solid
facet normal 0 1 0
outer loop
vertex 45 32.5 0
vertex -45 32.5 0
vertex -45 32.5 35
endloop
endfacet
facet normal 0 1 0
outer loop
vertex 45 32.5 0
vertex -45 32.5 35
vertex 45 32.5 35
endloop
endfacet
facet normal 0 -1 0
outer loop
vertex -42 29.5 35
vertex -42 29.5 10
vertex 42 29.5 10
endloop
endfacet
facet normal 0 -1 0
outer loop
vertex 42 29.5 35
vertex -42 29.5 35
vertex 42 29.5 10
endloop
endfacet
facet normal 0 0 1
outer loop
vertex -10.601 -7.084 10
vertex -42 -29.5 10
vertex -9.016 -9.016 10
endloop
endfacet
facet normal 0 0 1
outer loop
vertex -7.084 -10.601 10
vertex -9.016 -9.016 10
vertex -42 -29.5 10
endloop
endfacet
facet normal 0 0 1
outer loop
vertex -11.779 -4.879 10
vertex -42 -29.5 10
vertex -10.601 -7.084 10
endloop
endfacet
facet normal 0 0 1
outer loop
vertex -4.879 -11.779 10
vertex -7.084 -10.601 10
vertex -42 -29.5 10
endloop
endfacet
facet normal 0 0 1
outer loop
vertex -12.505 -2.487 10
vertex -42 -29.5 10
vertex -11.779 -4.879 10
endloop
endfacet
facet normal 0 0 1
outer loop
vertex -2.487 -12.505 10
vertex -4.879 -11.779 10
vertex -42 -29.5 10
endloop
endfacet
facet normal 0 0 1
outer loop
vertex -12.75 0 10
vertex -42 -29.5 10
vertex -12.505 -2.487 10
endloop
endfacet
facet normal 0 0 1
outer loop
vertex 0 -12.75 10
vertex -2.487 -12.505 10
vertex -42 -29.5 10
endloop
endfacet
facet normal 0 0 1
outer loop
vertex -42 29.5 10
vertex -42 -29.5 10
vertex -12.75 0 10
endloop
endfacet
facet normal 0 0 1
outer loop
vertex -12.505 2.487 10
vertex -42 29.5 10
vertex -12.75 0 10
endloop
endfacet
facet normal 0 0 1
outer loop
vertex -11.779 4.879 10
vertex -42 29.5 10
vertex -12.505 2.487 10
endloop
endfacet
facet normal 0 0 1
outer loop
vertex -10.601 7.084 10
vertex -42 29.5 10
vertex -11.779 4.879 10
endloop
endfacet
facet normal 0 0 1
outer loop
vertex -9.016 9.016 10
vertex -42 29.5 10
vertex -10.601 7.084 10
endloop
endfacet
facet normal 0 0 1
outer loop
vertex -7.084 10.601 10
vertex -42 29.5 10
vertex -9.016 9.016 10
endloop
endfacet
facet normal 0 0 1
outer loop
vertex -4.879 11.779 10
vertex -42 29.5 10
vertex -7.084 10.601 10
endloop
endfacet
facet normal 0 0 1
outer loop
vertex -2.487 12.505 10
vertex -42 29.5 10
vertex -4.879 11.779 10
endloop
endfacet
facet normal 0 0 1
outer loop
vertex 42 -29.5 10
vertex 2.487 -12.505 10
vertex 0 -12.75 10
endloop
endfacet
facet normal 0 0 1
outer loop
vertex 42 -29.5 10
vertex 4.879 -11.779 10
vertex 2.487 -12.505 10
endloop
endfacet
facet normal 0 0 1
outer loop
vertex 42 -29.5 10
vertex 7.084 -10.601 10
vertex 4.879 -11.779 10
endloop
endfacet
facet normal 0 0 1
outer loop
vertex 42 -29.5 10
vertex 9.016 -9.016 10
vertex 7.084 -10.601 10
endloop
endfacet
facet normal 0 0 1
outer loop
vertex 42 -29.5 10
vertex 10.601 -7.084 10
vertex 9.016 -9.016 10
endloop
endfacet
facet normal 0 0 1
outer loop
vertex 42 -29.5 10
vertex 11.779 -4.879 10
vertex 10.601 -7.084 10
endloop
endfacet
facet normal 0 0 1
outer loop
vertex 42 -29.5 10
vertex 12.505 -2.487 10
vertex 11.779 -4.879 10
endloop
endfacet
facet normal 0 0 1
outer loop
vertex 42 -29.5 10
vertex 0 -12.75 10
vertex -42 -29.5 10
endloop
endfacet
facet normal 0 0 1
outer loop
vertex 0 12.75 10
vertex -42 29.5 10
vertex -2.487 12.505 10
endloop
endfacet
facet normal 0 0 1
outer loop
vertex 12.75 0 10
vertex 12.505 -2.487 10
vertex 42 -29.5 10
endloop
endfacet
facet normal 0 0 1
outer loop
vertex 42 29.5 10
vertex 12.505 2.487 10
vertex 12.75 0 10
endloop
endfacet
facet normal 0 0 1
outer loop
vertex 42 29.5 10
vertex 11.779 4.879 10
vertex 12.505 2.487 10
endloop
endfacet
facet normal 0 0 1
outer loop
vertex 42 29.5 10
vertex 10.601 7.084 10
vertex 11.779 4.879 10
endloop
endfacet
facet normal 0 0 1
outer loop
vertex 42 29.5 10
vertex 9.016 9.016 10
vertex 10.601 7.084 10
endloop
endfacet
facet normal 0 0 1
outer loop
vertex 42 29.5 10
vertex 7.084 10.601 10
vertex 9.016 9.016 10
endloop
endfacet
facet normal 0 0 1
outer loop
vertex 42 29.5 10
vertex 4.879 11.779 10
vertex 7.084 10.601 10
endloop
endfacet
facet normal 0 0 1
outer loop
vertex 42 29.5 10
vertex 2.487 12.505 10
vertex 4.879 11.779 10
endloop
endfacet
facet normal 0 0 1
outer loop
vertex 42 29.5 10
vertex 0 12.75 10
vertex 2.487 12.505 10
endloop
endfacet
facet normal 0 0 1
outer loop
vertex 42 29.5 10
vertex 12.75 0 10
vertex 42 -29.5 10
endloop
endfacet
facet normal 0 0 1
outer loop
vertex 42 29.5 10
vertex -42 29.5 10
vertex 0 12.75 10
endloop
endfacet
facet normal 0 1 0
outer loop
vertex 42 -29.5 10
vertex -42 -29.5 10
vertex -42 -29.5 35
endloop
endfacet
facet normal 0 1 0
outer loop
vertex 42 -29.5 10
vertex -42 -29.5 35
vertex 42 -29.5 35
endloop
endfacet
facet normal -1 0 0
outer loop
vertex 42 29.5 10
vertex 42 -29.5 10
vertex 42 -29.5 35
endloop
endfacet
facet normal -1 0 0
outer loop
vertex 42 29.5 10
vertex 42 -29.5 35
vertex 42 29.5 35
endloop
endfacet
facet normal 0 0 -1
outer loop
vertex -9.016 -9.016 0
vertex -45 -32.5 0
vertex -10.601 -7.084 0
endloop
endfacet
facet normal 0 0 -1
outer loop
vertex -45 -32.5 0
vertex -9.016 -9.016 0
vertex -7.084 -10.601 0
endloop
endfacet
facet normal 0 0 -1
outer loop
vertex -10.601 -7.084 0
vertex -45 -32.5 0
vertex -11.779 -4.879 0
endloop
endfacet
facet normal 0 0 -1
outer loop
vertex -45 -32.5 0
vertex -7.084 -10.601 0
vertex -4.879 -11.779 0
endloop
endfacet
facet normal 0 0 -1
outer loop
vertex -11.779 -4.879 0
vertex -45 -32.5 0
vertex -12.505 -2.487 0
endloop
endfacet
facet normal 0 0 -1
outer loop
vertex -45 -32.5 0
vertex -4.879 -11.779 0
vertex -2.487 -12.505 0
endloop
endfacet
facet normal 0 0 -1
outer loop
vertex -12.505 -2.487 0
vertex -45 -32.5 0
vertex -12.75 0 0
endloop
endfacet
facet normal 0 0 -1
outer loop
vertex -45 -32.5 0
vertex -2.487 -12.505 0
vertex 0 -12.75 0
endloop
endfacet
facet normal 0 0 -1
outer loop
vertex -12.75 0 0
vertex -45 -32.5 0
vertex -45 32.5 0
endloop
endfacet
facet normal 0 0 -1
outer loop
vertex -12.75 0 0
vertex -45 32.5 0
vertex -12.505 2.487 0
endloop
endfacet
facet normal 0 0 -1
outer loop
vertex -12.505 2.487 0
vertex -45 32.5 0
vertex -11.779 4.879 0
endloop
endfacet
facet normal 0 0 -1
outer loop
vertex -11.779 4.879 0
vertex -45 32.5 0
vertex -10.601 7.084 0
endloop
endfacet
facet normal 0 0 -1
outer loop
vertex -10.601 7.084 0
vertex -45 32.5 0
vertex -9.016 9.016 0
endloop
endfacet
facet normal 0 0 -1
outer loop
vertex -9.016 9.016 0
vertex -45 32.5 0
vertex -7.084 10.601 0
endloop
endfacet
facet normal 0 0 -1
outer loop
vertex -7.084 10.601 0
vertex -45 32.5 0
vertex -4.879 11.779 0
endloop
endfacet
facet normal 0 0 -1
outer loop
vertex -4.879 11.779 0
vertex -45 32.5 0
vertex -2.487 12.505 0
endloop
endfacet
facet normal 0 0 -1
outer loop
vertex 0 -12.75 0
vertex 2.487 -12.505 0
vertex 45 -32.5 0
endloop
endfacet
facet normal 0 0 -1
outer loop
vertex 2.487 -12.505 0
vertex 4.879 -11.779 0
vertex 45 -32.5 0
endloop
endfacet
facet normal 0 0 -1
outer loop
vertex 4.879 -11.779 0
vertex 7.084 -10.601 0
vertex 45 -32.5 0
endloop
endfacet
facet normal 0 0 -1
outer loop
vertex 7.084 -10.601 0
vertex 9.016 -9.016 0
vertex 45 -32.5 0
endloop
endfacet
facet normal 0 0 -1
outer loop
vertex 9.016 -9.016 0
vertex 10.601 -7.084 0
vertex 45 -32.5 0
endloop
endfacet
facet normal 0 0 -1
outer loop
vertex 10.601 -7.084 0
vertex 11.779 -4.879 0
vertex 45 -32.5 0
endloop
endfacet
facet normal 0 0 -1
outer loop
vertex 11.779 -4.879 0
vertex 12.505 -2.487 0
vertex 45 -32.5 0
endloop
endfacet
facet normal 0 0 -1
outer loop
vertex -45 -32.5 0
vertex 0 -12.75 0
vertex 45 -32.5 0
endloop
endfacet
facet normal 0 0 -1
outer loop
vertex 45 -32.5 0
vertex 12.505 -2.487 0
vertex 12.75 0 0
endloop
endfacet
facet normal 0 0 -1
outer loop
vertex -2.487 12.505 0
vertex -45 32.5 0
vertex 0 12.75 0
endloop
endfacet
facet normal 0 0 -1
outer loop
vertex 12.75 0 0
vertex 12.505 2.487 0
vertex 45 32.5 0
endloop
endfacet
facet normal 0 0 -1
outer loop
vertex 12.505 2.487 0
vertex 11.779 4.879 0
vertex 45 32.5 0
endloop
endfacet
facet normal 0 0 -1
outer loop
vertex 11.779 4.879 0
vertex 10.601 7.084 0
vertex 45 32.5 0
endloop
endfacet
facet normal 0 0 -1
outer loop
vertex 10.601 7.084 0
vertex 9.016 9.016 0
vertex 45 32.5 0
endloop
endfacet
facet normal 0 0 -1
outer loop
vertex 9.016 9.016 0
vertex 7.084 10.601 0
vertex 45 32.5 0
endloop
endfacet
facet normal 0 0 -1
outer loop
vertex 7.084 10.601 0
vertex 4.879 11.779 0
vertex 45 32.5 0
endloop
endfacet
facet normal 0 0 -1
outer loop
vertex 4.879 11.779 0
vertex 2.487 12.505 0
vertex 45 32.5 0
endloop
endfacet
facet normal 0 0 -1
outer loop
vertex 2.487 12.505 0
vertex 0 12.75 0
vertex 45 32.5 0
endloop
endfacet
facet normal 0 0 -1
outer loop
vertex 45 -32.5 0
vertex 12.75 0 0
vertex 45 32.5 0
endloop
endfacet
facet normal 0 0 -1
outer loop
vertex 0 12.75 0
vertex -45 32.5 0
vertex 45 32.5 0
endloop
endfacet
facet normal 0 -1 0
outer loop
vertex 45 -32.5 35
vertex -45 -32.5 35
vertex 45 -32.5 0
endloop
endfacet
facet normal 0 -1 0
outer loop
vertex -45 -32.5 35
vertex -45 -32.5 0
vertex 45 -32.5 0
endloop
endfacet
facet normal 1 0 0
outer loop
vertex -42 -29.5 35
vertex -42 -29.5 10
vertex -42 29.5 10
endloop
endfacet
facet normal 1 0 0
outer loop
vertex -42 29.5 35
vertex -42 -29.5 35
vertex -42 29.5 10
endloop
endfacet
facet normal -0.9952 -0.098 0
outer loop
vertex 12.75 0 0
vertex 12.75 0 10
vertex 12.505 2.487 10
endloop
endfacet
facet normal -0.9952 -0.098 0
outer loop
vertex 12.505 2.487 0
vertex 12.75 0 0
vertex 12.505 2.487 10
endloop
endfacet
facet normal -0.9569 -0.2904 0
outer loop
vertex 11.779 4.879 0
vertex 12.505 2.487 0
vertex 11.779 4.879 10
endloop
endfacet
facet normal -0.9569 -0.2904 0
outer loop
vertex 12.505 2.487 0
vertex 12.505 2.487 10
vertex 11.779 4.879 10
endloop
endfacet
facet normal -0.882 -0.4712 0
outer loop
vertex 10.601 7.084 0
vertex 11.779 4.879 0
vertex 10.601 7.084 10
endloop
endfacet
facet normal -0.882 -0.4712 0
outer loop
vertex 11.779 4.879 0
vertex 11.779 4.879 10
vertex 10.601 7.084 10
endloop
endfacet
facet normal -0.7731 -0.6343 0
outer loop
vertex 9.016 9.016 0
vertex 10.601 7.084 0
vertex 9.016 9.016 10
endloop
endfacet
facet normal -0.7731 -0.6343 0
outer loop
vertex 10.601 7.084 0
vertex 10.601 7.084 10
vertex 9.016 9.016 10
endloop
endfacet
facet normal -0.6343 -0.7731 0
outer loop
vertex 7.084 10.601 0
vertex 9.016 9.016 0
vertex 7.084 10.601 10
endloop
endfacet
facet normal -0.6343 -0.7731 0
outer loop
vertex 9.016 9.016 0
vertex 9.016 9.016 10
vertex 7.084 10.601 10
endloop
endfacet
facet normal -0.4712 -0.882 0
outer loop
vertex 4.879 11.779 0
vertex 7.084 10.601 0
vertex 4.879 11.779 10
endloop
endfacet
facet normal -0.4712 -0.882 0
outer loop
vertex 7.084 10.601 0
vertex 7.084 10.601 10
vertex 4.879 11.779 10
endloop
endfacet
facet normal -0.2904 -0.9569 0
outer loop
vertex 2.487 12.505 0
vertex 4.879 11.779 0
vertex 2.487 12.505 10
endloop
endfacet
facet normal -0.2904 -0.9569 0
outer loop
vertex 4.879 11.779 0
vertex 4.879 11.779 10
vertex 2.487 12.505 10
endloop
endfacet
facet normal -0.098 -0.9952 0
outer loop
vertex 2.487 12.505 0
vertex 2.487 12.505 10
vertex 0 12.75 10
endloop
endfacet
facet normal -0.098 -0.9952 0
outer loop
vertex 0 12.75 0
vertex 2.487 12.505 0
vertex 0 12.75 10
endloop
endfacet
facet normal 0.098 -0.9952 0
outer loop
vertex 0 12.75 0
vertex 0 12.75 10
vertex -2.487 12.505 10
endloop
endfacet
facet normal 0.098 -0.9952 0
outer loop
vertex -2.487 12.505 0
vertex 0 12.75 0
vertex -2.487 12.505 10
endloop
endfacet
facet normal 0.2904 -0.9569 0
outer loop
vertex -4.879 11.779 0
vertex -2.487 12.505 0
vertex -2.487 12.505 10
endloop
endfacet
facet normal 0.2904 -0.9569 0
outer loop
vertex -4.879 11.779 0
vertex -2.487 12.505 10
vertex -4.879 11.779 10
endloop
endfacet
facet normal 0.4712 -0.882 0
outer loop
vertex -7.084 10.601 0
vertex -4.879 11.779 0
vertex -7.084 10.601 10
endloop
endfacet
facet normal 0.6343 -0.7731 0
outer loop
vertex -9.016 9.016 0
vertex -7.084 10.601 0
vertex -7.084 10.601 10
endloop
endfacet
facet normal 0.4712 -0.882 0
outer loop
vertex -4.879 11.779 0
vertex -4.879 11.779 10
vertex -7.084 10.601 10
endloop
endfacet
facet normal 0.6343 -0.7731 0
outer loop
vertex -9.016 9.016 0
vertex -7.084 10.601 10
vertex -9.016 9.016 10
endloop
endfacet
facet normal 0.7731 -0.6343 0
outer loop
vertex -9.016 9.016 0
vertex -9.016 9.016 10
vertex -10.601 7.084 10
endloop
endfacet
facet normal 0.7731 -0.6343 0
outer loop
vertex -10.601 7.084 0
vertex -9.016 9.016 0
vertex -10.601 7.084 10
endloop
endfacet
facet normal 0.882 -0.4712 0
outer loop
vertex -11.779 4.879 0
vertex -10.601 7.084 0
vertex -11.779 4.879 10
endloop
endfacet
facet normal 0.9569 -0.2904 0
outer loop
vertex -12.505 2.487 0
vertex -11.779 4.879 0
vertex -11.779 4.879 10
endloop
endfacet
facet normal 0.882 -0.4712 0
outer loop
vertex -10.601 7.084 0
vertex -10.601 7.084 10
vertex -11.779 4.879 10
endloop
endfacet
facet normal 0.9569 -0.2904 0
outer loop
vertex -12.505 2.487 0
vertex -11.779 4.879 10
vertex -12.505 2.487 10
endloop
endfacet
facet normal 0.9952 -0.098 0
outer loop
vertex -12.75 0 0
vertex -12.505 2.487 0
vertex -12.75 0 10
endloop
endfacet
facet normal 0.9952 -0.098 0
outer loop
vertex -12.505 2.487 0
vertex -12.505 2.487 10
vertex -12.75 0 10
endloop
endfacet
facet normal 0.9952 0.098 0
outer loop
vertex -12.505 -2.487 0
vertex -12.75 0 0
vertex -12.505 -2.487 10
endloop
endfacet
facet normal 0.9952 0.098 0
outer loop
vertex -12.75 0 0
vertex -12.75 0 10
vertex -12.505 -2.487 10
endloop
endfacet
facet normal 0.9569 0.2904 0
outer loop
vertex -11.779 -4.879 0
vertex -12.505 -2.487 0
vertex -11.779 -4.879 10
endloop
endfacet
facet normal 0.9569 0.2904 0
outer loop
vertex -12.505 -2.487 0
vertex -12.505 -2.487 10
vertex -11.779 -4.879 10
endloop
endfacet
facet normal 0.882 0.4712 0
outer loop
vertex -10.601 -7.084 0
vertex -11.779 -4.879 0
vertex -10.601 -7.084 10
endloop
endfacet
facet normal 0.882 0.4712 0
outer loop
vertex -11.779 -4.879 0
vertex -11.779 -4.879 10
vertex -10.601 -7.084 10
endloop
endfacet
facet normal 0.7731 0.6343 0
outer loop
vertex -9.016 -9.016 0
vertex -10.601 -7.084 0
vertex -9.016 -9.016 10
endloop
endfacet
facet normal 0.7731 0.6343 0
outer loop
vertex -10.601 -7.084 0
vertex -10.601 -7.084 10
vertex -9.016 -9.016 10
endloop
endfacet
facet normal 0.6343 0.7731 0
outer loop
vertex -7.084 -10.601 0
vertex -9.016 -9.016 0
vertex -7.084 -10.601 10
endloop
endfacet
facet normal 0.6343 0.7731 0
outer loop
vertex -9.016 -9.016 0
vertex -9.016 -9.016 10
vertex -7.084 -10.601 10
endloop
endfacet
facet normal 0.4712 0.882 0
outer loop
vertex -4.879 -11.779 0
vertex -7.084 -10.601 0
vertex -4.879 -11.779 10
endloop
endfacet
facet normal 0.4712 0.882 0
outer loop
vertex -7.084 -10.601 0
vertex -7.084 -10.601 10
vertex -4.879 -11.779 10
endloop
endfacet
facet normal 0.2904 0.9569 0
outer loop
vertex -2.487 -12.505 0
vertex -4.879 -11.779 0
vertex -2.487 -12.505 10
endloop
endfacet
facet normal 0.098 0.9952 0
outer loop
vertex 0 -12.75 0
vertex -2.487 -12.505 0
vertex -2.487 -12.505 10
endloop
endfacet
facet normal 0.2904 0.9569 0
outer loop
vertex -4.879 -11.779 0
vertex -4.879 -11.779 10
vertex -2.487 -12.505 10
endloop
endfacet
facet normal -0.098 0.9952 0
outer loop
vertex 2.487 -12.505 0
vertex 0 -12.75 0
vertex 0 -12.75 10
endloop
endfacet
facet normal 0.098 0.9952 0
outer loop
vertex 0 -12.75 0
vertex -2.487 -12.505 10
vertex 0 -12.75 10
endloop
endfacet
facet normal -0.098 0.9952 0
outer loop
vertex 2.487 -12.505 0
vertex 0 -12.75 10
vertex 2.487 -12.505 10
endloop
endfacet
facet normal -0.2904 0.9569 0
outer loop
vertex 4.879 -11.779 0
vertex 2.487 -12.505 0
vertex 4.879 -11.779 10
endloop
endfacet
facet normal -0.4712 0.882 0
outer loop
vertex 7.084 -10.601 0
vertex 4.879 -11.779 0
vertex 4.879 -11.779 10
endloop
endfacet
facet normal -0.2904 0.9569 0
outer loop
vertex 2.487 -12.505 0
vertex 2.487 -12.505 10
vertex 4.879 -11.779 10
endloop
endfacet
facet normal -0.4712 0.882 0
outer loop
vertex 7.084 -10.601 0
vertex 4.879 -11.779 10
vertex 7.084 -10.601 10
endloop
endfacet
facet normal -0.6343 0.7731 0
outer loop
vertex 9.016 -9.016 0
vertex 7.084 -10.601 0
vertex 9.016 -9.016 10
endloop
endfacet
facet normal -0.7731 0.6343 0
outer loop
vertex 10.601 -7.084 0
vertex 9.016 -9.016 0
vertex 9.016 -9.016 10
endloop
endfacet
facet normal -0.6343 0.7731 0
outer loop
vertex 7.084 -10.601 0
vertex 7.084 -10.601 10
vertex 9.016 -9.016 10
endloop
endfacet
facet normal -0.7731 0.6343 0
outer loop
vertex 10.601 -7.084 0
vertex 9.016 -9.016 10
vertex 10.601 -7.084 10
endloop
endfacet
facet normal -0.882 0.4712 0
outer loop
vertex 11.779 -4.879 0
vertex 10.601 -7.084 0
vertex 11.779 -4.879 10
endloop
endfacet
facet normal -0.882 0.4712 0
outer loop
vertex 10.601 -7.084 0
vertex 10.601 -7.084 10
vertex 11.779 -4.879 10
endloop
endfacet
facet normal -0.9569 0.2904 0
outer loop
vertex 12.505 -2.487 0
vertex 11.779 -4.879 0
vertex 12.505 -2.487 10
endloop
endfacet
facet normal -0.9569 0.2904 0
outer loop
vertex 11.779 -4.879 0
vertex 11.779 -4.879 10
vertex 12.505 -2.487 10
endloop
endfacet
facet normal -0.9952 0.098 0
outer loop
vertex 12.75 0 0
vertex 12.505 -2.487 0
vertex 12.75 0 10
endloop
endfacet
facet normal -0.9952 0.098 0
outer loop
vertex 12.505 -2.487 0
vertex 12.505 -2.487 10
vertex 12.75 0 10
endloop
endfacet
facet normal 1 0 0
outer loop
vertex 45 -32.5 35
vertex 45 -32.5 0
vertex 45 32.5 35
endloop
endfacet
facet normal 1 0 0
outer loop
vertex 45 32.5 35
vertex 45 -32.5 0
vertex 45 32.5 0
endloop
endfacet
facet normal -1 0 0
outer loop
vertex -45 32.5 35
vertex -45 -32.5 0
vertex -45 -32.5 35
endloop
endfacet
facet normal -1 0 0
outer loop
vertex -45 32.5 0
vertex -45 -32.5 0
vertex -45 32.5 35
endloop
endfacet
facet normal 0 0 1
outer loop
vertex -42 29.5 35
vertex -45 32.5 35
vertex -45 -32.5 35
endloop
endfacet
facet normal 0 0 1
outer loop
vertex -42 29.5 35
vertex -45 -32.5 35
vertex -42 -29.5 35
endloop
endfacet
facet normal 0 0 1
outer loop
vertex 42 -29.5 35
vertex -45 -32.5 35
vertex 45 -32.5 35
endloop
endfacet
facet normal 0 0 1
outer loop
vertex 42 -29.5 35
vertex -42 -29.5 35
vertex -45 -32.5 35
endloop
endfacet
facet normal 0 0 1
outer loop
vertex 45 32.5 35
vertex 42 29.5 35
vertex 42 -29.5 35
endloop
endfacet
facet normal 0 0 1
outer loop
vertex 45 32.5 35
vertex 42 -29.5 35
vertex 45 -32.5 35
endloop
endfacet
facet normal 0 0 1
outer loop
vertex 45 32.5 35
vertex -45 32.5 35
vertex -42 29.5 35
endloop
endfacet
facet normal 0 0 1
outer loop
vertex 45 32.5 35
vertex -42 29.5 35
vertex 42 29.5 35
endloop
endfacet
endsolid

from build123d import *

# Parameters (mm, degrees)
F0_W     = 90
F0_H     = 65
F1_DEPTH = 10
F2_R     = 12.75
F3_DEPTH = 10
F4_W     = 90
F4_H     = 65
F4_W_2   = 84
F4_H_2   = 59
F5_DEPTH = 25


with BuildPart() as f1:
    # F0 (on Top) → F1 (new body)
    with BuildSketch(Plane.XY):
        Rectangle(F0_W, F0_H)
    extrude(amount=F1_DEPTH)

    # F2 (on face) → F3 (cut)
    with BuildSketch(Plane.XY.offset(10)):
        Circle(F2_R)
    extrude(amount=-F3_DEPTH, mode=Mode.SUBTRACT)

    # F4 (on face) → F5 (join)
    with BuildSketch(Plane.XY.offset(10)):
        Rectangle(F4_W, F4_H)
        Rectangle(F4_W_2, F4_H_2, mode=Mode.SUBTRACT)
    extrude(amount=F5_DEPTH)


solid = f1.part
